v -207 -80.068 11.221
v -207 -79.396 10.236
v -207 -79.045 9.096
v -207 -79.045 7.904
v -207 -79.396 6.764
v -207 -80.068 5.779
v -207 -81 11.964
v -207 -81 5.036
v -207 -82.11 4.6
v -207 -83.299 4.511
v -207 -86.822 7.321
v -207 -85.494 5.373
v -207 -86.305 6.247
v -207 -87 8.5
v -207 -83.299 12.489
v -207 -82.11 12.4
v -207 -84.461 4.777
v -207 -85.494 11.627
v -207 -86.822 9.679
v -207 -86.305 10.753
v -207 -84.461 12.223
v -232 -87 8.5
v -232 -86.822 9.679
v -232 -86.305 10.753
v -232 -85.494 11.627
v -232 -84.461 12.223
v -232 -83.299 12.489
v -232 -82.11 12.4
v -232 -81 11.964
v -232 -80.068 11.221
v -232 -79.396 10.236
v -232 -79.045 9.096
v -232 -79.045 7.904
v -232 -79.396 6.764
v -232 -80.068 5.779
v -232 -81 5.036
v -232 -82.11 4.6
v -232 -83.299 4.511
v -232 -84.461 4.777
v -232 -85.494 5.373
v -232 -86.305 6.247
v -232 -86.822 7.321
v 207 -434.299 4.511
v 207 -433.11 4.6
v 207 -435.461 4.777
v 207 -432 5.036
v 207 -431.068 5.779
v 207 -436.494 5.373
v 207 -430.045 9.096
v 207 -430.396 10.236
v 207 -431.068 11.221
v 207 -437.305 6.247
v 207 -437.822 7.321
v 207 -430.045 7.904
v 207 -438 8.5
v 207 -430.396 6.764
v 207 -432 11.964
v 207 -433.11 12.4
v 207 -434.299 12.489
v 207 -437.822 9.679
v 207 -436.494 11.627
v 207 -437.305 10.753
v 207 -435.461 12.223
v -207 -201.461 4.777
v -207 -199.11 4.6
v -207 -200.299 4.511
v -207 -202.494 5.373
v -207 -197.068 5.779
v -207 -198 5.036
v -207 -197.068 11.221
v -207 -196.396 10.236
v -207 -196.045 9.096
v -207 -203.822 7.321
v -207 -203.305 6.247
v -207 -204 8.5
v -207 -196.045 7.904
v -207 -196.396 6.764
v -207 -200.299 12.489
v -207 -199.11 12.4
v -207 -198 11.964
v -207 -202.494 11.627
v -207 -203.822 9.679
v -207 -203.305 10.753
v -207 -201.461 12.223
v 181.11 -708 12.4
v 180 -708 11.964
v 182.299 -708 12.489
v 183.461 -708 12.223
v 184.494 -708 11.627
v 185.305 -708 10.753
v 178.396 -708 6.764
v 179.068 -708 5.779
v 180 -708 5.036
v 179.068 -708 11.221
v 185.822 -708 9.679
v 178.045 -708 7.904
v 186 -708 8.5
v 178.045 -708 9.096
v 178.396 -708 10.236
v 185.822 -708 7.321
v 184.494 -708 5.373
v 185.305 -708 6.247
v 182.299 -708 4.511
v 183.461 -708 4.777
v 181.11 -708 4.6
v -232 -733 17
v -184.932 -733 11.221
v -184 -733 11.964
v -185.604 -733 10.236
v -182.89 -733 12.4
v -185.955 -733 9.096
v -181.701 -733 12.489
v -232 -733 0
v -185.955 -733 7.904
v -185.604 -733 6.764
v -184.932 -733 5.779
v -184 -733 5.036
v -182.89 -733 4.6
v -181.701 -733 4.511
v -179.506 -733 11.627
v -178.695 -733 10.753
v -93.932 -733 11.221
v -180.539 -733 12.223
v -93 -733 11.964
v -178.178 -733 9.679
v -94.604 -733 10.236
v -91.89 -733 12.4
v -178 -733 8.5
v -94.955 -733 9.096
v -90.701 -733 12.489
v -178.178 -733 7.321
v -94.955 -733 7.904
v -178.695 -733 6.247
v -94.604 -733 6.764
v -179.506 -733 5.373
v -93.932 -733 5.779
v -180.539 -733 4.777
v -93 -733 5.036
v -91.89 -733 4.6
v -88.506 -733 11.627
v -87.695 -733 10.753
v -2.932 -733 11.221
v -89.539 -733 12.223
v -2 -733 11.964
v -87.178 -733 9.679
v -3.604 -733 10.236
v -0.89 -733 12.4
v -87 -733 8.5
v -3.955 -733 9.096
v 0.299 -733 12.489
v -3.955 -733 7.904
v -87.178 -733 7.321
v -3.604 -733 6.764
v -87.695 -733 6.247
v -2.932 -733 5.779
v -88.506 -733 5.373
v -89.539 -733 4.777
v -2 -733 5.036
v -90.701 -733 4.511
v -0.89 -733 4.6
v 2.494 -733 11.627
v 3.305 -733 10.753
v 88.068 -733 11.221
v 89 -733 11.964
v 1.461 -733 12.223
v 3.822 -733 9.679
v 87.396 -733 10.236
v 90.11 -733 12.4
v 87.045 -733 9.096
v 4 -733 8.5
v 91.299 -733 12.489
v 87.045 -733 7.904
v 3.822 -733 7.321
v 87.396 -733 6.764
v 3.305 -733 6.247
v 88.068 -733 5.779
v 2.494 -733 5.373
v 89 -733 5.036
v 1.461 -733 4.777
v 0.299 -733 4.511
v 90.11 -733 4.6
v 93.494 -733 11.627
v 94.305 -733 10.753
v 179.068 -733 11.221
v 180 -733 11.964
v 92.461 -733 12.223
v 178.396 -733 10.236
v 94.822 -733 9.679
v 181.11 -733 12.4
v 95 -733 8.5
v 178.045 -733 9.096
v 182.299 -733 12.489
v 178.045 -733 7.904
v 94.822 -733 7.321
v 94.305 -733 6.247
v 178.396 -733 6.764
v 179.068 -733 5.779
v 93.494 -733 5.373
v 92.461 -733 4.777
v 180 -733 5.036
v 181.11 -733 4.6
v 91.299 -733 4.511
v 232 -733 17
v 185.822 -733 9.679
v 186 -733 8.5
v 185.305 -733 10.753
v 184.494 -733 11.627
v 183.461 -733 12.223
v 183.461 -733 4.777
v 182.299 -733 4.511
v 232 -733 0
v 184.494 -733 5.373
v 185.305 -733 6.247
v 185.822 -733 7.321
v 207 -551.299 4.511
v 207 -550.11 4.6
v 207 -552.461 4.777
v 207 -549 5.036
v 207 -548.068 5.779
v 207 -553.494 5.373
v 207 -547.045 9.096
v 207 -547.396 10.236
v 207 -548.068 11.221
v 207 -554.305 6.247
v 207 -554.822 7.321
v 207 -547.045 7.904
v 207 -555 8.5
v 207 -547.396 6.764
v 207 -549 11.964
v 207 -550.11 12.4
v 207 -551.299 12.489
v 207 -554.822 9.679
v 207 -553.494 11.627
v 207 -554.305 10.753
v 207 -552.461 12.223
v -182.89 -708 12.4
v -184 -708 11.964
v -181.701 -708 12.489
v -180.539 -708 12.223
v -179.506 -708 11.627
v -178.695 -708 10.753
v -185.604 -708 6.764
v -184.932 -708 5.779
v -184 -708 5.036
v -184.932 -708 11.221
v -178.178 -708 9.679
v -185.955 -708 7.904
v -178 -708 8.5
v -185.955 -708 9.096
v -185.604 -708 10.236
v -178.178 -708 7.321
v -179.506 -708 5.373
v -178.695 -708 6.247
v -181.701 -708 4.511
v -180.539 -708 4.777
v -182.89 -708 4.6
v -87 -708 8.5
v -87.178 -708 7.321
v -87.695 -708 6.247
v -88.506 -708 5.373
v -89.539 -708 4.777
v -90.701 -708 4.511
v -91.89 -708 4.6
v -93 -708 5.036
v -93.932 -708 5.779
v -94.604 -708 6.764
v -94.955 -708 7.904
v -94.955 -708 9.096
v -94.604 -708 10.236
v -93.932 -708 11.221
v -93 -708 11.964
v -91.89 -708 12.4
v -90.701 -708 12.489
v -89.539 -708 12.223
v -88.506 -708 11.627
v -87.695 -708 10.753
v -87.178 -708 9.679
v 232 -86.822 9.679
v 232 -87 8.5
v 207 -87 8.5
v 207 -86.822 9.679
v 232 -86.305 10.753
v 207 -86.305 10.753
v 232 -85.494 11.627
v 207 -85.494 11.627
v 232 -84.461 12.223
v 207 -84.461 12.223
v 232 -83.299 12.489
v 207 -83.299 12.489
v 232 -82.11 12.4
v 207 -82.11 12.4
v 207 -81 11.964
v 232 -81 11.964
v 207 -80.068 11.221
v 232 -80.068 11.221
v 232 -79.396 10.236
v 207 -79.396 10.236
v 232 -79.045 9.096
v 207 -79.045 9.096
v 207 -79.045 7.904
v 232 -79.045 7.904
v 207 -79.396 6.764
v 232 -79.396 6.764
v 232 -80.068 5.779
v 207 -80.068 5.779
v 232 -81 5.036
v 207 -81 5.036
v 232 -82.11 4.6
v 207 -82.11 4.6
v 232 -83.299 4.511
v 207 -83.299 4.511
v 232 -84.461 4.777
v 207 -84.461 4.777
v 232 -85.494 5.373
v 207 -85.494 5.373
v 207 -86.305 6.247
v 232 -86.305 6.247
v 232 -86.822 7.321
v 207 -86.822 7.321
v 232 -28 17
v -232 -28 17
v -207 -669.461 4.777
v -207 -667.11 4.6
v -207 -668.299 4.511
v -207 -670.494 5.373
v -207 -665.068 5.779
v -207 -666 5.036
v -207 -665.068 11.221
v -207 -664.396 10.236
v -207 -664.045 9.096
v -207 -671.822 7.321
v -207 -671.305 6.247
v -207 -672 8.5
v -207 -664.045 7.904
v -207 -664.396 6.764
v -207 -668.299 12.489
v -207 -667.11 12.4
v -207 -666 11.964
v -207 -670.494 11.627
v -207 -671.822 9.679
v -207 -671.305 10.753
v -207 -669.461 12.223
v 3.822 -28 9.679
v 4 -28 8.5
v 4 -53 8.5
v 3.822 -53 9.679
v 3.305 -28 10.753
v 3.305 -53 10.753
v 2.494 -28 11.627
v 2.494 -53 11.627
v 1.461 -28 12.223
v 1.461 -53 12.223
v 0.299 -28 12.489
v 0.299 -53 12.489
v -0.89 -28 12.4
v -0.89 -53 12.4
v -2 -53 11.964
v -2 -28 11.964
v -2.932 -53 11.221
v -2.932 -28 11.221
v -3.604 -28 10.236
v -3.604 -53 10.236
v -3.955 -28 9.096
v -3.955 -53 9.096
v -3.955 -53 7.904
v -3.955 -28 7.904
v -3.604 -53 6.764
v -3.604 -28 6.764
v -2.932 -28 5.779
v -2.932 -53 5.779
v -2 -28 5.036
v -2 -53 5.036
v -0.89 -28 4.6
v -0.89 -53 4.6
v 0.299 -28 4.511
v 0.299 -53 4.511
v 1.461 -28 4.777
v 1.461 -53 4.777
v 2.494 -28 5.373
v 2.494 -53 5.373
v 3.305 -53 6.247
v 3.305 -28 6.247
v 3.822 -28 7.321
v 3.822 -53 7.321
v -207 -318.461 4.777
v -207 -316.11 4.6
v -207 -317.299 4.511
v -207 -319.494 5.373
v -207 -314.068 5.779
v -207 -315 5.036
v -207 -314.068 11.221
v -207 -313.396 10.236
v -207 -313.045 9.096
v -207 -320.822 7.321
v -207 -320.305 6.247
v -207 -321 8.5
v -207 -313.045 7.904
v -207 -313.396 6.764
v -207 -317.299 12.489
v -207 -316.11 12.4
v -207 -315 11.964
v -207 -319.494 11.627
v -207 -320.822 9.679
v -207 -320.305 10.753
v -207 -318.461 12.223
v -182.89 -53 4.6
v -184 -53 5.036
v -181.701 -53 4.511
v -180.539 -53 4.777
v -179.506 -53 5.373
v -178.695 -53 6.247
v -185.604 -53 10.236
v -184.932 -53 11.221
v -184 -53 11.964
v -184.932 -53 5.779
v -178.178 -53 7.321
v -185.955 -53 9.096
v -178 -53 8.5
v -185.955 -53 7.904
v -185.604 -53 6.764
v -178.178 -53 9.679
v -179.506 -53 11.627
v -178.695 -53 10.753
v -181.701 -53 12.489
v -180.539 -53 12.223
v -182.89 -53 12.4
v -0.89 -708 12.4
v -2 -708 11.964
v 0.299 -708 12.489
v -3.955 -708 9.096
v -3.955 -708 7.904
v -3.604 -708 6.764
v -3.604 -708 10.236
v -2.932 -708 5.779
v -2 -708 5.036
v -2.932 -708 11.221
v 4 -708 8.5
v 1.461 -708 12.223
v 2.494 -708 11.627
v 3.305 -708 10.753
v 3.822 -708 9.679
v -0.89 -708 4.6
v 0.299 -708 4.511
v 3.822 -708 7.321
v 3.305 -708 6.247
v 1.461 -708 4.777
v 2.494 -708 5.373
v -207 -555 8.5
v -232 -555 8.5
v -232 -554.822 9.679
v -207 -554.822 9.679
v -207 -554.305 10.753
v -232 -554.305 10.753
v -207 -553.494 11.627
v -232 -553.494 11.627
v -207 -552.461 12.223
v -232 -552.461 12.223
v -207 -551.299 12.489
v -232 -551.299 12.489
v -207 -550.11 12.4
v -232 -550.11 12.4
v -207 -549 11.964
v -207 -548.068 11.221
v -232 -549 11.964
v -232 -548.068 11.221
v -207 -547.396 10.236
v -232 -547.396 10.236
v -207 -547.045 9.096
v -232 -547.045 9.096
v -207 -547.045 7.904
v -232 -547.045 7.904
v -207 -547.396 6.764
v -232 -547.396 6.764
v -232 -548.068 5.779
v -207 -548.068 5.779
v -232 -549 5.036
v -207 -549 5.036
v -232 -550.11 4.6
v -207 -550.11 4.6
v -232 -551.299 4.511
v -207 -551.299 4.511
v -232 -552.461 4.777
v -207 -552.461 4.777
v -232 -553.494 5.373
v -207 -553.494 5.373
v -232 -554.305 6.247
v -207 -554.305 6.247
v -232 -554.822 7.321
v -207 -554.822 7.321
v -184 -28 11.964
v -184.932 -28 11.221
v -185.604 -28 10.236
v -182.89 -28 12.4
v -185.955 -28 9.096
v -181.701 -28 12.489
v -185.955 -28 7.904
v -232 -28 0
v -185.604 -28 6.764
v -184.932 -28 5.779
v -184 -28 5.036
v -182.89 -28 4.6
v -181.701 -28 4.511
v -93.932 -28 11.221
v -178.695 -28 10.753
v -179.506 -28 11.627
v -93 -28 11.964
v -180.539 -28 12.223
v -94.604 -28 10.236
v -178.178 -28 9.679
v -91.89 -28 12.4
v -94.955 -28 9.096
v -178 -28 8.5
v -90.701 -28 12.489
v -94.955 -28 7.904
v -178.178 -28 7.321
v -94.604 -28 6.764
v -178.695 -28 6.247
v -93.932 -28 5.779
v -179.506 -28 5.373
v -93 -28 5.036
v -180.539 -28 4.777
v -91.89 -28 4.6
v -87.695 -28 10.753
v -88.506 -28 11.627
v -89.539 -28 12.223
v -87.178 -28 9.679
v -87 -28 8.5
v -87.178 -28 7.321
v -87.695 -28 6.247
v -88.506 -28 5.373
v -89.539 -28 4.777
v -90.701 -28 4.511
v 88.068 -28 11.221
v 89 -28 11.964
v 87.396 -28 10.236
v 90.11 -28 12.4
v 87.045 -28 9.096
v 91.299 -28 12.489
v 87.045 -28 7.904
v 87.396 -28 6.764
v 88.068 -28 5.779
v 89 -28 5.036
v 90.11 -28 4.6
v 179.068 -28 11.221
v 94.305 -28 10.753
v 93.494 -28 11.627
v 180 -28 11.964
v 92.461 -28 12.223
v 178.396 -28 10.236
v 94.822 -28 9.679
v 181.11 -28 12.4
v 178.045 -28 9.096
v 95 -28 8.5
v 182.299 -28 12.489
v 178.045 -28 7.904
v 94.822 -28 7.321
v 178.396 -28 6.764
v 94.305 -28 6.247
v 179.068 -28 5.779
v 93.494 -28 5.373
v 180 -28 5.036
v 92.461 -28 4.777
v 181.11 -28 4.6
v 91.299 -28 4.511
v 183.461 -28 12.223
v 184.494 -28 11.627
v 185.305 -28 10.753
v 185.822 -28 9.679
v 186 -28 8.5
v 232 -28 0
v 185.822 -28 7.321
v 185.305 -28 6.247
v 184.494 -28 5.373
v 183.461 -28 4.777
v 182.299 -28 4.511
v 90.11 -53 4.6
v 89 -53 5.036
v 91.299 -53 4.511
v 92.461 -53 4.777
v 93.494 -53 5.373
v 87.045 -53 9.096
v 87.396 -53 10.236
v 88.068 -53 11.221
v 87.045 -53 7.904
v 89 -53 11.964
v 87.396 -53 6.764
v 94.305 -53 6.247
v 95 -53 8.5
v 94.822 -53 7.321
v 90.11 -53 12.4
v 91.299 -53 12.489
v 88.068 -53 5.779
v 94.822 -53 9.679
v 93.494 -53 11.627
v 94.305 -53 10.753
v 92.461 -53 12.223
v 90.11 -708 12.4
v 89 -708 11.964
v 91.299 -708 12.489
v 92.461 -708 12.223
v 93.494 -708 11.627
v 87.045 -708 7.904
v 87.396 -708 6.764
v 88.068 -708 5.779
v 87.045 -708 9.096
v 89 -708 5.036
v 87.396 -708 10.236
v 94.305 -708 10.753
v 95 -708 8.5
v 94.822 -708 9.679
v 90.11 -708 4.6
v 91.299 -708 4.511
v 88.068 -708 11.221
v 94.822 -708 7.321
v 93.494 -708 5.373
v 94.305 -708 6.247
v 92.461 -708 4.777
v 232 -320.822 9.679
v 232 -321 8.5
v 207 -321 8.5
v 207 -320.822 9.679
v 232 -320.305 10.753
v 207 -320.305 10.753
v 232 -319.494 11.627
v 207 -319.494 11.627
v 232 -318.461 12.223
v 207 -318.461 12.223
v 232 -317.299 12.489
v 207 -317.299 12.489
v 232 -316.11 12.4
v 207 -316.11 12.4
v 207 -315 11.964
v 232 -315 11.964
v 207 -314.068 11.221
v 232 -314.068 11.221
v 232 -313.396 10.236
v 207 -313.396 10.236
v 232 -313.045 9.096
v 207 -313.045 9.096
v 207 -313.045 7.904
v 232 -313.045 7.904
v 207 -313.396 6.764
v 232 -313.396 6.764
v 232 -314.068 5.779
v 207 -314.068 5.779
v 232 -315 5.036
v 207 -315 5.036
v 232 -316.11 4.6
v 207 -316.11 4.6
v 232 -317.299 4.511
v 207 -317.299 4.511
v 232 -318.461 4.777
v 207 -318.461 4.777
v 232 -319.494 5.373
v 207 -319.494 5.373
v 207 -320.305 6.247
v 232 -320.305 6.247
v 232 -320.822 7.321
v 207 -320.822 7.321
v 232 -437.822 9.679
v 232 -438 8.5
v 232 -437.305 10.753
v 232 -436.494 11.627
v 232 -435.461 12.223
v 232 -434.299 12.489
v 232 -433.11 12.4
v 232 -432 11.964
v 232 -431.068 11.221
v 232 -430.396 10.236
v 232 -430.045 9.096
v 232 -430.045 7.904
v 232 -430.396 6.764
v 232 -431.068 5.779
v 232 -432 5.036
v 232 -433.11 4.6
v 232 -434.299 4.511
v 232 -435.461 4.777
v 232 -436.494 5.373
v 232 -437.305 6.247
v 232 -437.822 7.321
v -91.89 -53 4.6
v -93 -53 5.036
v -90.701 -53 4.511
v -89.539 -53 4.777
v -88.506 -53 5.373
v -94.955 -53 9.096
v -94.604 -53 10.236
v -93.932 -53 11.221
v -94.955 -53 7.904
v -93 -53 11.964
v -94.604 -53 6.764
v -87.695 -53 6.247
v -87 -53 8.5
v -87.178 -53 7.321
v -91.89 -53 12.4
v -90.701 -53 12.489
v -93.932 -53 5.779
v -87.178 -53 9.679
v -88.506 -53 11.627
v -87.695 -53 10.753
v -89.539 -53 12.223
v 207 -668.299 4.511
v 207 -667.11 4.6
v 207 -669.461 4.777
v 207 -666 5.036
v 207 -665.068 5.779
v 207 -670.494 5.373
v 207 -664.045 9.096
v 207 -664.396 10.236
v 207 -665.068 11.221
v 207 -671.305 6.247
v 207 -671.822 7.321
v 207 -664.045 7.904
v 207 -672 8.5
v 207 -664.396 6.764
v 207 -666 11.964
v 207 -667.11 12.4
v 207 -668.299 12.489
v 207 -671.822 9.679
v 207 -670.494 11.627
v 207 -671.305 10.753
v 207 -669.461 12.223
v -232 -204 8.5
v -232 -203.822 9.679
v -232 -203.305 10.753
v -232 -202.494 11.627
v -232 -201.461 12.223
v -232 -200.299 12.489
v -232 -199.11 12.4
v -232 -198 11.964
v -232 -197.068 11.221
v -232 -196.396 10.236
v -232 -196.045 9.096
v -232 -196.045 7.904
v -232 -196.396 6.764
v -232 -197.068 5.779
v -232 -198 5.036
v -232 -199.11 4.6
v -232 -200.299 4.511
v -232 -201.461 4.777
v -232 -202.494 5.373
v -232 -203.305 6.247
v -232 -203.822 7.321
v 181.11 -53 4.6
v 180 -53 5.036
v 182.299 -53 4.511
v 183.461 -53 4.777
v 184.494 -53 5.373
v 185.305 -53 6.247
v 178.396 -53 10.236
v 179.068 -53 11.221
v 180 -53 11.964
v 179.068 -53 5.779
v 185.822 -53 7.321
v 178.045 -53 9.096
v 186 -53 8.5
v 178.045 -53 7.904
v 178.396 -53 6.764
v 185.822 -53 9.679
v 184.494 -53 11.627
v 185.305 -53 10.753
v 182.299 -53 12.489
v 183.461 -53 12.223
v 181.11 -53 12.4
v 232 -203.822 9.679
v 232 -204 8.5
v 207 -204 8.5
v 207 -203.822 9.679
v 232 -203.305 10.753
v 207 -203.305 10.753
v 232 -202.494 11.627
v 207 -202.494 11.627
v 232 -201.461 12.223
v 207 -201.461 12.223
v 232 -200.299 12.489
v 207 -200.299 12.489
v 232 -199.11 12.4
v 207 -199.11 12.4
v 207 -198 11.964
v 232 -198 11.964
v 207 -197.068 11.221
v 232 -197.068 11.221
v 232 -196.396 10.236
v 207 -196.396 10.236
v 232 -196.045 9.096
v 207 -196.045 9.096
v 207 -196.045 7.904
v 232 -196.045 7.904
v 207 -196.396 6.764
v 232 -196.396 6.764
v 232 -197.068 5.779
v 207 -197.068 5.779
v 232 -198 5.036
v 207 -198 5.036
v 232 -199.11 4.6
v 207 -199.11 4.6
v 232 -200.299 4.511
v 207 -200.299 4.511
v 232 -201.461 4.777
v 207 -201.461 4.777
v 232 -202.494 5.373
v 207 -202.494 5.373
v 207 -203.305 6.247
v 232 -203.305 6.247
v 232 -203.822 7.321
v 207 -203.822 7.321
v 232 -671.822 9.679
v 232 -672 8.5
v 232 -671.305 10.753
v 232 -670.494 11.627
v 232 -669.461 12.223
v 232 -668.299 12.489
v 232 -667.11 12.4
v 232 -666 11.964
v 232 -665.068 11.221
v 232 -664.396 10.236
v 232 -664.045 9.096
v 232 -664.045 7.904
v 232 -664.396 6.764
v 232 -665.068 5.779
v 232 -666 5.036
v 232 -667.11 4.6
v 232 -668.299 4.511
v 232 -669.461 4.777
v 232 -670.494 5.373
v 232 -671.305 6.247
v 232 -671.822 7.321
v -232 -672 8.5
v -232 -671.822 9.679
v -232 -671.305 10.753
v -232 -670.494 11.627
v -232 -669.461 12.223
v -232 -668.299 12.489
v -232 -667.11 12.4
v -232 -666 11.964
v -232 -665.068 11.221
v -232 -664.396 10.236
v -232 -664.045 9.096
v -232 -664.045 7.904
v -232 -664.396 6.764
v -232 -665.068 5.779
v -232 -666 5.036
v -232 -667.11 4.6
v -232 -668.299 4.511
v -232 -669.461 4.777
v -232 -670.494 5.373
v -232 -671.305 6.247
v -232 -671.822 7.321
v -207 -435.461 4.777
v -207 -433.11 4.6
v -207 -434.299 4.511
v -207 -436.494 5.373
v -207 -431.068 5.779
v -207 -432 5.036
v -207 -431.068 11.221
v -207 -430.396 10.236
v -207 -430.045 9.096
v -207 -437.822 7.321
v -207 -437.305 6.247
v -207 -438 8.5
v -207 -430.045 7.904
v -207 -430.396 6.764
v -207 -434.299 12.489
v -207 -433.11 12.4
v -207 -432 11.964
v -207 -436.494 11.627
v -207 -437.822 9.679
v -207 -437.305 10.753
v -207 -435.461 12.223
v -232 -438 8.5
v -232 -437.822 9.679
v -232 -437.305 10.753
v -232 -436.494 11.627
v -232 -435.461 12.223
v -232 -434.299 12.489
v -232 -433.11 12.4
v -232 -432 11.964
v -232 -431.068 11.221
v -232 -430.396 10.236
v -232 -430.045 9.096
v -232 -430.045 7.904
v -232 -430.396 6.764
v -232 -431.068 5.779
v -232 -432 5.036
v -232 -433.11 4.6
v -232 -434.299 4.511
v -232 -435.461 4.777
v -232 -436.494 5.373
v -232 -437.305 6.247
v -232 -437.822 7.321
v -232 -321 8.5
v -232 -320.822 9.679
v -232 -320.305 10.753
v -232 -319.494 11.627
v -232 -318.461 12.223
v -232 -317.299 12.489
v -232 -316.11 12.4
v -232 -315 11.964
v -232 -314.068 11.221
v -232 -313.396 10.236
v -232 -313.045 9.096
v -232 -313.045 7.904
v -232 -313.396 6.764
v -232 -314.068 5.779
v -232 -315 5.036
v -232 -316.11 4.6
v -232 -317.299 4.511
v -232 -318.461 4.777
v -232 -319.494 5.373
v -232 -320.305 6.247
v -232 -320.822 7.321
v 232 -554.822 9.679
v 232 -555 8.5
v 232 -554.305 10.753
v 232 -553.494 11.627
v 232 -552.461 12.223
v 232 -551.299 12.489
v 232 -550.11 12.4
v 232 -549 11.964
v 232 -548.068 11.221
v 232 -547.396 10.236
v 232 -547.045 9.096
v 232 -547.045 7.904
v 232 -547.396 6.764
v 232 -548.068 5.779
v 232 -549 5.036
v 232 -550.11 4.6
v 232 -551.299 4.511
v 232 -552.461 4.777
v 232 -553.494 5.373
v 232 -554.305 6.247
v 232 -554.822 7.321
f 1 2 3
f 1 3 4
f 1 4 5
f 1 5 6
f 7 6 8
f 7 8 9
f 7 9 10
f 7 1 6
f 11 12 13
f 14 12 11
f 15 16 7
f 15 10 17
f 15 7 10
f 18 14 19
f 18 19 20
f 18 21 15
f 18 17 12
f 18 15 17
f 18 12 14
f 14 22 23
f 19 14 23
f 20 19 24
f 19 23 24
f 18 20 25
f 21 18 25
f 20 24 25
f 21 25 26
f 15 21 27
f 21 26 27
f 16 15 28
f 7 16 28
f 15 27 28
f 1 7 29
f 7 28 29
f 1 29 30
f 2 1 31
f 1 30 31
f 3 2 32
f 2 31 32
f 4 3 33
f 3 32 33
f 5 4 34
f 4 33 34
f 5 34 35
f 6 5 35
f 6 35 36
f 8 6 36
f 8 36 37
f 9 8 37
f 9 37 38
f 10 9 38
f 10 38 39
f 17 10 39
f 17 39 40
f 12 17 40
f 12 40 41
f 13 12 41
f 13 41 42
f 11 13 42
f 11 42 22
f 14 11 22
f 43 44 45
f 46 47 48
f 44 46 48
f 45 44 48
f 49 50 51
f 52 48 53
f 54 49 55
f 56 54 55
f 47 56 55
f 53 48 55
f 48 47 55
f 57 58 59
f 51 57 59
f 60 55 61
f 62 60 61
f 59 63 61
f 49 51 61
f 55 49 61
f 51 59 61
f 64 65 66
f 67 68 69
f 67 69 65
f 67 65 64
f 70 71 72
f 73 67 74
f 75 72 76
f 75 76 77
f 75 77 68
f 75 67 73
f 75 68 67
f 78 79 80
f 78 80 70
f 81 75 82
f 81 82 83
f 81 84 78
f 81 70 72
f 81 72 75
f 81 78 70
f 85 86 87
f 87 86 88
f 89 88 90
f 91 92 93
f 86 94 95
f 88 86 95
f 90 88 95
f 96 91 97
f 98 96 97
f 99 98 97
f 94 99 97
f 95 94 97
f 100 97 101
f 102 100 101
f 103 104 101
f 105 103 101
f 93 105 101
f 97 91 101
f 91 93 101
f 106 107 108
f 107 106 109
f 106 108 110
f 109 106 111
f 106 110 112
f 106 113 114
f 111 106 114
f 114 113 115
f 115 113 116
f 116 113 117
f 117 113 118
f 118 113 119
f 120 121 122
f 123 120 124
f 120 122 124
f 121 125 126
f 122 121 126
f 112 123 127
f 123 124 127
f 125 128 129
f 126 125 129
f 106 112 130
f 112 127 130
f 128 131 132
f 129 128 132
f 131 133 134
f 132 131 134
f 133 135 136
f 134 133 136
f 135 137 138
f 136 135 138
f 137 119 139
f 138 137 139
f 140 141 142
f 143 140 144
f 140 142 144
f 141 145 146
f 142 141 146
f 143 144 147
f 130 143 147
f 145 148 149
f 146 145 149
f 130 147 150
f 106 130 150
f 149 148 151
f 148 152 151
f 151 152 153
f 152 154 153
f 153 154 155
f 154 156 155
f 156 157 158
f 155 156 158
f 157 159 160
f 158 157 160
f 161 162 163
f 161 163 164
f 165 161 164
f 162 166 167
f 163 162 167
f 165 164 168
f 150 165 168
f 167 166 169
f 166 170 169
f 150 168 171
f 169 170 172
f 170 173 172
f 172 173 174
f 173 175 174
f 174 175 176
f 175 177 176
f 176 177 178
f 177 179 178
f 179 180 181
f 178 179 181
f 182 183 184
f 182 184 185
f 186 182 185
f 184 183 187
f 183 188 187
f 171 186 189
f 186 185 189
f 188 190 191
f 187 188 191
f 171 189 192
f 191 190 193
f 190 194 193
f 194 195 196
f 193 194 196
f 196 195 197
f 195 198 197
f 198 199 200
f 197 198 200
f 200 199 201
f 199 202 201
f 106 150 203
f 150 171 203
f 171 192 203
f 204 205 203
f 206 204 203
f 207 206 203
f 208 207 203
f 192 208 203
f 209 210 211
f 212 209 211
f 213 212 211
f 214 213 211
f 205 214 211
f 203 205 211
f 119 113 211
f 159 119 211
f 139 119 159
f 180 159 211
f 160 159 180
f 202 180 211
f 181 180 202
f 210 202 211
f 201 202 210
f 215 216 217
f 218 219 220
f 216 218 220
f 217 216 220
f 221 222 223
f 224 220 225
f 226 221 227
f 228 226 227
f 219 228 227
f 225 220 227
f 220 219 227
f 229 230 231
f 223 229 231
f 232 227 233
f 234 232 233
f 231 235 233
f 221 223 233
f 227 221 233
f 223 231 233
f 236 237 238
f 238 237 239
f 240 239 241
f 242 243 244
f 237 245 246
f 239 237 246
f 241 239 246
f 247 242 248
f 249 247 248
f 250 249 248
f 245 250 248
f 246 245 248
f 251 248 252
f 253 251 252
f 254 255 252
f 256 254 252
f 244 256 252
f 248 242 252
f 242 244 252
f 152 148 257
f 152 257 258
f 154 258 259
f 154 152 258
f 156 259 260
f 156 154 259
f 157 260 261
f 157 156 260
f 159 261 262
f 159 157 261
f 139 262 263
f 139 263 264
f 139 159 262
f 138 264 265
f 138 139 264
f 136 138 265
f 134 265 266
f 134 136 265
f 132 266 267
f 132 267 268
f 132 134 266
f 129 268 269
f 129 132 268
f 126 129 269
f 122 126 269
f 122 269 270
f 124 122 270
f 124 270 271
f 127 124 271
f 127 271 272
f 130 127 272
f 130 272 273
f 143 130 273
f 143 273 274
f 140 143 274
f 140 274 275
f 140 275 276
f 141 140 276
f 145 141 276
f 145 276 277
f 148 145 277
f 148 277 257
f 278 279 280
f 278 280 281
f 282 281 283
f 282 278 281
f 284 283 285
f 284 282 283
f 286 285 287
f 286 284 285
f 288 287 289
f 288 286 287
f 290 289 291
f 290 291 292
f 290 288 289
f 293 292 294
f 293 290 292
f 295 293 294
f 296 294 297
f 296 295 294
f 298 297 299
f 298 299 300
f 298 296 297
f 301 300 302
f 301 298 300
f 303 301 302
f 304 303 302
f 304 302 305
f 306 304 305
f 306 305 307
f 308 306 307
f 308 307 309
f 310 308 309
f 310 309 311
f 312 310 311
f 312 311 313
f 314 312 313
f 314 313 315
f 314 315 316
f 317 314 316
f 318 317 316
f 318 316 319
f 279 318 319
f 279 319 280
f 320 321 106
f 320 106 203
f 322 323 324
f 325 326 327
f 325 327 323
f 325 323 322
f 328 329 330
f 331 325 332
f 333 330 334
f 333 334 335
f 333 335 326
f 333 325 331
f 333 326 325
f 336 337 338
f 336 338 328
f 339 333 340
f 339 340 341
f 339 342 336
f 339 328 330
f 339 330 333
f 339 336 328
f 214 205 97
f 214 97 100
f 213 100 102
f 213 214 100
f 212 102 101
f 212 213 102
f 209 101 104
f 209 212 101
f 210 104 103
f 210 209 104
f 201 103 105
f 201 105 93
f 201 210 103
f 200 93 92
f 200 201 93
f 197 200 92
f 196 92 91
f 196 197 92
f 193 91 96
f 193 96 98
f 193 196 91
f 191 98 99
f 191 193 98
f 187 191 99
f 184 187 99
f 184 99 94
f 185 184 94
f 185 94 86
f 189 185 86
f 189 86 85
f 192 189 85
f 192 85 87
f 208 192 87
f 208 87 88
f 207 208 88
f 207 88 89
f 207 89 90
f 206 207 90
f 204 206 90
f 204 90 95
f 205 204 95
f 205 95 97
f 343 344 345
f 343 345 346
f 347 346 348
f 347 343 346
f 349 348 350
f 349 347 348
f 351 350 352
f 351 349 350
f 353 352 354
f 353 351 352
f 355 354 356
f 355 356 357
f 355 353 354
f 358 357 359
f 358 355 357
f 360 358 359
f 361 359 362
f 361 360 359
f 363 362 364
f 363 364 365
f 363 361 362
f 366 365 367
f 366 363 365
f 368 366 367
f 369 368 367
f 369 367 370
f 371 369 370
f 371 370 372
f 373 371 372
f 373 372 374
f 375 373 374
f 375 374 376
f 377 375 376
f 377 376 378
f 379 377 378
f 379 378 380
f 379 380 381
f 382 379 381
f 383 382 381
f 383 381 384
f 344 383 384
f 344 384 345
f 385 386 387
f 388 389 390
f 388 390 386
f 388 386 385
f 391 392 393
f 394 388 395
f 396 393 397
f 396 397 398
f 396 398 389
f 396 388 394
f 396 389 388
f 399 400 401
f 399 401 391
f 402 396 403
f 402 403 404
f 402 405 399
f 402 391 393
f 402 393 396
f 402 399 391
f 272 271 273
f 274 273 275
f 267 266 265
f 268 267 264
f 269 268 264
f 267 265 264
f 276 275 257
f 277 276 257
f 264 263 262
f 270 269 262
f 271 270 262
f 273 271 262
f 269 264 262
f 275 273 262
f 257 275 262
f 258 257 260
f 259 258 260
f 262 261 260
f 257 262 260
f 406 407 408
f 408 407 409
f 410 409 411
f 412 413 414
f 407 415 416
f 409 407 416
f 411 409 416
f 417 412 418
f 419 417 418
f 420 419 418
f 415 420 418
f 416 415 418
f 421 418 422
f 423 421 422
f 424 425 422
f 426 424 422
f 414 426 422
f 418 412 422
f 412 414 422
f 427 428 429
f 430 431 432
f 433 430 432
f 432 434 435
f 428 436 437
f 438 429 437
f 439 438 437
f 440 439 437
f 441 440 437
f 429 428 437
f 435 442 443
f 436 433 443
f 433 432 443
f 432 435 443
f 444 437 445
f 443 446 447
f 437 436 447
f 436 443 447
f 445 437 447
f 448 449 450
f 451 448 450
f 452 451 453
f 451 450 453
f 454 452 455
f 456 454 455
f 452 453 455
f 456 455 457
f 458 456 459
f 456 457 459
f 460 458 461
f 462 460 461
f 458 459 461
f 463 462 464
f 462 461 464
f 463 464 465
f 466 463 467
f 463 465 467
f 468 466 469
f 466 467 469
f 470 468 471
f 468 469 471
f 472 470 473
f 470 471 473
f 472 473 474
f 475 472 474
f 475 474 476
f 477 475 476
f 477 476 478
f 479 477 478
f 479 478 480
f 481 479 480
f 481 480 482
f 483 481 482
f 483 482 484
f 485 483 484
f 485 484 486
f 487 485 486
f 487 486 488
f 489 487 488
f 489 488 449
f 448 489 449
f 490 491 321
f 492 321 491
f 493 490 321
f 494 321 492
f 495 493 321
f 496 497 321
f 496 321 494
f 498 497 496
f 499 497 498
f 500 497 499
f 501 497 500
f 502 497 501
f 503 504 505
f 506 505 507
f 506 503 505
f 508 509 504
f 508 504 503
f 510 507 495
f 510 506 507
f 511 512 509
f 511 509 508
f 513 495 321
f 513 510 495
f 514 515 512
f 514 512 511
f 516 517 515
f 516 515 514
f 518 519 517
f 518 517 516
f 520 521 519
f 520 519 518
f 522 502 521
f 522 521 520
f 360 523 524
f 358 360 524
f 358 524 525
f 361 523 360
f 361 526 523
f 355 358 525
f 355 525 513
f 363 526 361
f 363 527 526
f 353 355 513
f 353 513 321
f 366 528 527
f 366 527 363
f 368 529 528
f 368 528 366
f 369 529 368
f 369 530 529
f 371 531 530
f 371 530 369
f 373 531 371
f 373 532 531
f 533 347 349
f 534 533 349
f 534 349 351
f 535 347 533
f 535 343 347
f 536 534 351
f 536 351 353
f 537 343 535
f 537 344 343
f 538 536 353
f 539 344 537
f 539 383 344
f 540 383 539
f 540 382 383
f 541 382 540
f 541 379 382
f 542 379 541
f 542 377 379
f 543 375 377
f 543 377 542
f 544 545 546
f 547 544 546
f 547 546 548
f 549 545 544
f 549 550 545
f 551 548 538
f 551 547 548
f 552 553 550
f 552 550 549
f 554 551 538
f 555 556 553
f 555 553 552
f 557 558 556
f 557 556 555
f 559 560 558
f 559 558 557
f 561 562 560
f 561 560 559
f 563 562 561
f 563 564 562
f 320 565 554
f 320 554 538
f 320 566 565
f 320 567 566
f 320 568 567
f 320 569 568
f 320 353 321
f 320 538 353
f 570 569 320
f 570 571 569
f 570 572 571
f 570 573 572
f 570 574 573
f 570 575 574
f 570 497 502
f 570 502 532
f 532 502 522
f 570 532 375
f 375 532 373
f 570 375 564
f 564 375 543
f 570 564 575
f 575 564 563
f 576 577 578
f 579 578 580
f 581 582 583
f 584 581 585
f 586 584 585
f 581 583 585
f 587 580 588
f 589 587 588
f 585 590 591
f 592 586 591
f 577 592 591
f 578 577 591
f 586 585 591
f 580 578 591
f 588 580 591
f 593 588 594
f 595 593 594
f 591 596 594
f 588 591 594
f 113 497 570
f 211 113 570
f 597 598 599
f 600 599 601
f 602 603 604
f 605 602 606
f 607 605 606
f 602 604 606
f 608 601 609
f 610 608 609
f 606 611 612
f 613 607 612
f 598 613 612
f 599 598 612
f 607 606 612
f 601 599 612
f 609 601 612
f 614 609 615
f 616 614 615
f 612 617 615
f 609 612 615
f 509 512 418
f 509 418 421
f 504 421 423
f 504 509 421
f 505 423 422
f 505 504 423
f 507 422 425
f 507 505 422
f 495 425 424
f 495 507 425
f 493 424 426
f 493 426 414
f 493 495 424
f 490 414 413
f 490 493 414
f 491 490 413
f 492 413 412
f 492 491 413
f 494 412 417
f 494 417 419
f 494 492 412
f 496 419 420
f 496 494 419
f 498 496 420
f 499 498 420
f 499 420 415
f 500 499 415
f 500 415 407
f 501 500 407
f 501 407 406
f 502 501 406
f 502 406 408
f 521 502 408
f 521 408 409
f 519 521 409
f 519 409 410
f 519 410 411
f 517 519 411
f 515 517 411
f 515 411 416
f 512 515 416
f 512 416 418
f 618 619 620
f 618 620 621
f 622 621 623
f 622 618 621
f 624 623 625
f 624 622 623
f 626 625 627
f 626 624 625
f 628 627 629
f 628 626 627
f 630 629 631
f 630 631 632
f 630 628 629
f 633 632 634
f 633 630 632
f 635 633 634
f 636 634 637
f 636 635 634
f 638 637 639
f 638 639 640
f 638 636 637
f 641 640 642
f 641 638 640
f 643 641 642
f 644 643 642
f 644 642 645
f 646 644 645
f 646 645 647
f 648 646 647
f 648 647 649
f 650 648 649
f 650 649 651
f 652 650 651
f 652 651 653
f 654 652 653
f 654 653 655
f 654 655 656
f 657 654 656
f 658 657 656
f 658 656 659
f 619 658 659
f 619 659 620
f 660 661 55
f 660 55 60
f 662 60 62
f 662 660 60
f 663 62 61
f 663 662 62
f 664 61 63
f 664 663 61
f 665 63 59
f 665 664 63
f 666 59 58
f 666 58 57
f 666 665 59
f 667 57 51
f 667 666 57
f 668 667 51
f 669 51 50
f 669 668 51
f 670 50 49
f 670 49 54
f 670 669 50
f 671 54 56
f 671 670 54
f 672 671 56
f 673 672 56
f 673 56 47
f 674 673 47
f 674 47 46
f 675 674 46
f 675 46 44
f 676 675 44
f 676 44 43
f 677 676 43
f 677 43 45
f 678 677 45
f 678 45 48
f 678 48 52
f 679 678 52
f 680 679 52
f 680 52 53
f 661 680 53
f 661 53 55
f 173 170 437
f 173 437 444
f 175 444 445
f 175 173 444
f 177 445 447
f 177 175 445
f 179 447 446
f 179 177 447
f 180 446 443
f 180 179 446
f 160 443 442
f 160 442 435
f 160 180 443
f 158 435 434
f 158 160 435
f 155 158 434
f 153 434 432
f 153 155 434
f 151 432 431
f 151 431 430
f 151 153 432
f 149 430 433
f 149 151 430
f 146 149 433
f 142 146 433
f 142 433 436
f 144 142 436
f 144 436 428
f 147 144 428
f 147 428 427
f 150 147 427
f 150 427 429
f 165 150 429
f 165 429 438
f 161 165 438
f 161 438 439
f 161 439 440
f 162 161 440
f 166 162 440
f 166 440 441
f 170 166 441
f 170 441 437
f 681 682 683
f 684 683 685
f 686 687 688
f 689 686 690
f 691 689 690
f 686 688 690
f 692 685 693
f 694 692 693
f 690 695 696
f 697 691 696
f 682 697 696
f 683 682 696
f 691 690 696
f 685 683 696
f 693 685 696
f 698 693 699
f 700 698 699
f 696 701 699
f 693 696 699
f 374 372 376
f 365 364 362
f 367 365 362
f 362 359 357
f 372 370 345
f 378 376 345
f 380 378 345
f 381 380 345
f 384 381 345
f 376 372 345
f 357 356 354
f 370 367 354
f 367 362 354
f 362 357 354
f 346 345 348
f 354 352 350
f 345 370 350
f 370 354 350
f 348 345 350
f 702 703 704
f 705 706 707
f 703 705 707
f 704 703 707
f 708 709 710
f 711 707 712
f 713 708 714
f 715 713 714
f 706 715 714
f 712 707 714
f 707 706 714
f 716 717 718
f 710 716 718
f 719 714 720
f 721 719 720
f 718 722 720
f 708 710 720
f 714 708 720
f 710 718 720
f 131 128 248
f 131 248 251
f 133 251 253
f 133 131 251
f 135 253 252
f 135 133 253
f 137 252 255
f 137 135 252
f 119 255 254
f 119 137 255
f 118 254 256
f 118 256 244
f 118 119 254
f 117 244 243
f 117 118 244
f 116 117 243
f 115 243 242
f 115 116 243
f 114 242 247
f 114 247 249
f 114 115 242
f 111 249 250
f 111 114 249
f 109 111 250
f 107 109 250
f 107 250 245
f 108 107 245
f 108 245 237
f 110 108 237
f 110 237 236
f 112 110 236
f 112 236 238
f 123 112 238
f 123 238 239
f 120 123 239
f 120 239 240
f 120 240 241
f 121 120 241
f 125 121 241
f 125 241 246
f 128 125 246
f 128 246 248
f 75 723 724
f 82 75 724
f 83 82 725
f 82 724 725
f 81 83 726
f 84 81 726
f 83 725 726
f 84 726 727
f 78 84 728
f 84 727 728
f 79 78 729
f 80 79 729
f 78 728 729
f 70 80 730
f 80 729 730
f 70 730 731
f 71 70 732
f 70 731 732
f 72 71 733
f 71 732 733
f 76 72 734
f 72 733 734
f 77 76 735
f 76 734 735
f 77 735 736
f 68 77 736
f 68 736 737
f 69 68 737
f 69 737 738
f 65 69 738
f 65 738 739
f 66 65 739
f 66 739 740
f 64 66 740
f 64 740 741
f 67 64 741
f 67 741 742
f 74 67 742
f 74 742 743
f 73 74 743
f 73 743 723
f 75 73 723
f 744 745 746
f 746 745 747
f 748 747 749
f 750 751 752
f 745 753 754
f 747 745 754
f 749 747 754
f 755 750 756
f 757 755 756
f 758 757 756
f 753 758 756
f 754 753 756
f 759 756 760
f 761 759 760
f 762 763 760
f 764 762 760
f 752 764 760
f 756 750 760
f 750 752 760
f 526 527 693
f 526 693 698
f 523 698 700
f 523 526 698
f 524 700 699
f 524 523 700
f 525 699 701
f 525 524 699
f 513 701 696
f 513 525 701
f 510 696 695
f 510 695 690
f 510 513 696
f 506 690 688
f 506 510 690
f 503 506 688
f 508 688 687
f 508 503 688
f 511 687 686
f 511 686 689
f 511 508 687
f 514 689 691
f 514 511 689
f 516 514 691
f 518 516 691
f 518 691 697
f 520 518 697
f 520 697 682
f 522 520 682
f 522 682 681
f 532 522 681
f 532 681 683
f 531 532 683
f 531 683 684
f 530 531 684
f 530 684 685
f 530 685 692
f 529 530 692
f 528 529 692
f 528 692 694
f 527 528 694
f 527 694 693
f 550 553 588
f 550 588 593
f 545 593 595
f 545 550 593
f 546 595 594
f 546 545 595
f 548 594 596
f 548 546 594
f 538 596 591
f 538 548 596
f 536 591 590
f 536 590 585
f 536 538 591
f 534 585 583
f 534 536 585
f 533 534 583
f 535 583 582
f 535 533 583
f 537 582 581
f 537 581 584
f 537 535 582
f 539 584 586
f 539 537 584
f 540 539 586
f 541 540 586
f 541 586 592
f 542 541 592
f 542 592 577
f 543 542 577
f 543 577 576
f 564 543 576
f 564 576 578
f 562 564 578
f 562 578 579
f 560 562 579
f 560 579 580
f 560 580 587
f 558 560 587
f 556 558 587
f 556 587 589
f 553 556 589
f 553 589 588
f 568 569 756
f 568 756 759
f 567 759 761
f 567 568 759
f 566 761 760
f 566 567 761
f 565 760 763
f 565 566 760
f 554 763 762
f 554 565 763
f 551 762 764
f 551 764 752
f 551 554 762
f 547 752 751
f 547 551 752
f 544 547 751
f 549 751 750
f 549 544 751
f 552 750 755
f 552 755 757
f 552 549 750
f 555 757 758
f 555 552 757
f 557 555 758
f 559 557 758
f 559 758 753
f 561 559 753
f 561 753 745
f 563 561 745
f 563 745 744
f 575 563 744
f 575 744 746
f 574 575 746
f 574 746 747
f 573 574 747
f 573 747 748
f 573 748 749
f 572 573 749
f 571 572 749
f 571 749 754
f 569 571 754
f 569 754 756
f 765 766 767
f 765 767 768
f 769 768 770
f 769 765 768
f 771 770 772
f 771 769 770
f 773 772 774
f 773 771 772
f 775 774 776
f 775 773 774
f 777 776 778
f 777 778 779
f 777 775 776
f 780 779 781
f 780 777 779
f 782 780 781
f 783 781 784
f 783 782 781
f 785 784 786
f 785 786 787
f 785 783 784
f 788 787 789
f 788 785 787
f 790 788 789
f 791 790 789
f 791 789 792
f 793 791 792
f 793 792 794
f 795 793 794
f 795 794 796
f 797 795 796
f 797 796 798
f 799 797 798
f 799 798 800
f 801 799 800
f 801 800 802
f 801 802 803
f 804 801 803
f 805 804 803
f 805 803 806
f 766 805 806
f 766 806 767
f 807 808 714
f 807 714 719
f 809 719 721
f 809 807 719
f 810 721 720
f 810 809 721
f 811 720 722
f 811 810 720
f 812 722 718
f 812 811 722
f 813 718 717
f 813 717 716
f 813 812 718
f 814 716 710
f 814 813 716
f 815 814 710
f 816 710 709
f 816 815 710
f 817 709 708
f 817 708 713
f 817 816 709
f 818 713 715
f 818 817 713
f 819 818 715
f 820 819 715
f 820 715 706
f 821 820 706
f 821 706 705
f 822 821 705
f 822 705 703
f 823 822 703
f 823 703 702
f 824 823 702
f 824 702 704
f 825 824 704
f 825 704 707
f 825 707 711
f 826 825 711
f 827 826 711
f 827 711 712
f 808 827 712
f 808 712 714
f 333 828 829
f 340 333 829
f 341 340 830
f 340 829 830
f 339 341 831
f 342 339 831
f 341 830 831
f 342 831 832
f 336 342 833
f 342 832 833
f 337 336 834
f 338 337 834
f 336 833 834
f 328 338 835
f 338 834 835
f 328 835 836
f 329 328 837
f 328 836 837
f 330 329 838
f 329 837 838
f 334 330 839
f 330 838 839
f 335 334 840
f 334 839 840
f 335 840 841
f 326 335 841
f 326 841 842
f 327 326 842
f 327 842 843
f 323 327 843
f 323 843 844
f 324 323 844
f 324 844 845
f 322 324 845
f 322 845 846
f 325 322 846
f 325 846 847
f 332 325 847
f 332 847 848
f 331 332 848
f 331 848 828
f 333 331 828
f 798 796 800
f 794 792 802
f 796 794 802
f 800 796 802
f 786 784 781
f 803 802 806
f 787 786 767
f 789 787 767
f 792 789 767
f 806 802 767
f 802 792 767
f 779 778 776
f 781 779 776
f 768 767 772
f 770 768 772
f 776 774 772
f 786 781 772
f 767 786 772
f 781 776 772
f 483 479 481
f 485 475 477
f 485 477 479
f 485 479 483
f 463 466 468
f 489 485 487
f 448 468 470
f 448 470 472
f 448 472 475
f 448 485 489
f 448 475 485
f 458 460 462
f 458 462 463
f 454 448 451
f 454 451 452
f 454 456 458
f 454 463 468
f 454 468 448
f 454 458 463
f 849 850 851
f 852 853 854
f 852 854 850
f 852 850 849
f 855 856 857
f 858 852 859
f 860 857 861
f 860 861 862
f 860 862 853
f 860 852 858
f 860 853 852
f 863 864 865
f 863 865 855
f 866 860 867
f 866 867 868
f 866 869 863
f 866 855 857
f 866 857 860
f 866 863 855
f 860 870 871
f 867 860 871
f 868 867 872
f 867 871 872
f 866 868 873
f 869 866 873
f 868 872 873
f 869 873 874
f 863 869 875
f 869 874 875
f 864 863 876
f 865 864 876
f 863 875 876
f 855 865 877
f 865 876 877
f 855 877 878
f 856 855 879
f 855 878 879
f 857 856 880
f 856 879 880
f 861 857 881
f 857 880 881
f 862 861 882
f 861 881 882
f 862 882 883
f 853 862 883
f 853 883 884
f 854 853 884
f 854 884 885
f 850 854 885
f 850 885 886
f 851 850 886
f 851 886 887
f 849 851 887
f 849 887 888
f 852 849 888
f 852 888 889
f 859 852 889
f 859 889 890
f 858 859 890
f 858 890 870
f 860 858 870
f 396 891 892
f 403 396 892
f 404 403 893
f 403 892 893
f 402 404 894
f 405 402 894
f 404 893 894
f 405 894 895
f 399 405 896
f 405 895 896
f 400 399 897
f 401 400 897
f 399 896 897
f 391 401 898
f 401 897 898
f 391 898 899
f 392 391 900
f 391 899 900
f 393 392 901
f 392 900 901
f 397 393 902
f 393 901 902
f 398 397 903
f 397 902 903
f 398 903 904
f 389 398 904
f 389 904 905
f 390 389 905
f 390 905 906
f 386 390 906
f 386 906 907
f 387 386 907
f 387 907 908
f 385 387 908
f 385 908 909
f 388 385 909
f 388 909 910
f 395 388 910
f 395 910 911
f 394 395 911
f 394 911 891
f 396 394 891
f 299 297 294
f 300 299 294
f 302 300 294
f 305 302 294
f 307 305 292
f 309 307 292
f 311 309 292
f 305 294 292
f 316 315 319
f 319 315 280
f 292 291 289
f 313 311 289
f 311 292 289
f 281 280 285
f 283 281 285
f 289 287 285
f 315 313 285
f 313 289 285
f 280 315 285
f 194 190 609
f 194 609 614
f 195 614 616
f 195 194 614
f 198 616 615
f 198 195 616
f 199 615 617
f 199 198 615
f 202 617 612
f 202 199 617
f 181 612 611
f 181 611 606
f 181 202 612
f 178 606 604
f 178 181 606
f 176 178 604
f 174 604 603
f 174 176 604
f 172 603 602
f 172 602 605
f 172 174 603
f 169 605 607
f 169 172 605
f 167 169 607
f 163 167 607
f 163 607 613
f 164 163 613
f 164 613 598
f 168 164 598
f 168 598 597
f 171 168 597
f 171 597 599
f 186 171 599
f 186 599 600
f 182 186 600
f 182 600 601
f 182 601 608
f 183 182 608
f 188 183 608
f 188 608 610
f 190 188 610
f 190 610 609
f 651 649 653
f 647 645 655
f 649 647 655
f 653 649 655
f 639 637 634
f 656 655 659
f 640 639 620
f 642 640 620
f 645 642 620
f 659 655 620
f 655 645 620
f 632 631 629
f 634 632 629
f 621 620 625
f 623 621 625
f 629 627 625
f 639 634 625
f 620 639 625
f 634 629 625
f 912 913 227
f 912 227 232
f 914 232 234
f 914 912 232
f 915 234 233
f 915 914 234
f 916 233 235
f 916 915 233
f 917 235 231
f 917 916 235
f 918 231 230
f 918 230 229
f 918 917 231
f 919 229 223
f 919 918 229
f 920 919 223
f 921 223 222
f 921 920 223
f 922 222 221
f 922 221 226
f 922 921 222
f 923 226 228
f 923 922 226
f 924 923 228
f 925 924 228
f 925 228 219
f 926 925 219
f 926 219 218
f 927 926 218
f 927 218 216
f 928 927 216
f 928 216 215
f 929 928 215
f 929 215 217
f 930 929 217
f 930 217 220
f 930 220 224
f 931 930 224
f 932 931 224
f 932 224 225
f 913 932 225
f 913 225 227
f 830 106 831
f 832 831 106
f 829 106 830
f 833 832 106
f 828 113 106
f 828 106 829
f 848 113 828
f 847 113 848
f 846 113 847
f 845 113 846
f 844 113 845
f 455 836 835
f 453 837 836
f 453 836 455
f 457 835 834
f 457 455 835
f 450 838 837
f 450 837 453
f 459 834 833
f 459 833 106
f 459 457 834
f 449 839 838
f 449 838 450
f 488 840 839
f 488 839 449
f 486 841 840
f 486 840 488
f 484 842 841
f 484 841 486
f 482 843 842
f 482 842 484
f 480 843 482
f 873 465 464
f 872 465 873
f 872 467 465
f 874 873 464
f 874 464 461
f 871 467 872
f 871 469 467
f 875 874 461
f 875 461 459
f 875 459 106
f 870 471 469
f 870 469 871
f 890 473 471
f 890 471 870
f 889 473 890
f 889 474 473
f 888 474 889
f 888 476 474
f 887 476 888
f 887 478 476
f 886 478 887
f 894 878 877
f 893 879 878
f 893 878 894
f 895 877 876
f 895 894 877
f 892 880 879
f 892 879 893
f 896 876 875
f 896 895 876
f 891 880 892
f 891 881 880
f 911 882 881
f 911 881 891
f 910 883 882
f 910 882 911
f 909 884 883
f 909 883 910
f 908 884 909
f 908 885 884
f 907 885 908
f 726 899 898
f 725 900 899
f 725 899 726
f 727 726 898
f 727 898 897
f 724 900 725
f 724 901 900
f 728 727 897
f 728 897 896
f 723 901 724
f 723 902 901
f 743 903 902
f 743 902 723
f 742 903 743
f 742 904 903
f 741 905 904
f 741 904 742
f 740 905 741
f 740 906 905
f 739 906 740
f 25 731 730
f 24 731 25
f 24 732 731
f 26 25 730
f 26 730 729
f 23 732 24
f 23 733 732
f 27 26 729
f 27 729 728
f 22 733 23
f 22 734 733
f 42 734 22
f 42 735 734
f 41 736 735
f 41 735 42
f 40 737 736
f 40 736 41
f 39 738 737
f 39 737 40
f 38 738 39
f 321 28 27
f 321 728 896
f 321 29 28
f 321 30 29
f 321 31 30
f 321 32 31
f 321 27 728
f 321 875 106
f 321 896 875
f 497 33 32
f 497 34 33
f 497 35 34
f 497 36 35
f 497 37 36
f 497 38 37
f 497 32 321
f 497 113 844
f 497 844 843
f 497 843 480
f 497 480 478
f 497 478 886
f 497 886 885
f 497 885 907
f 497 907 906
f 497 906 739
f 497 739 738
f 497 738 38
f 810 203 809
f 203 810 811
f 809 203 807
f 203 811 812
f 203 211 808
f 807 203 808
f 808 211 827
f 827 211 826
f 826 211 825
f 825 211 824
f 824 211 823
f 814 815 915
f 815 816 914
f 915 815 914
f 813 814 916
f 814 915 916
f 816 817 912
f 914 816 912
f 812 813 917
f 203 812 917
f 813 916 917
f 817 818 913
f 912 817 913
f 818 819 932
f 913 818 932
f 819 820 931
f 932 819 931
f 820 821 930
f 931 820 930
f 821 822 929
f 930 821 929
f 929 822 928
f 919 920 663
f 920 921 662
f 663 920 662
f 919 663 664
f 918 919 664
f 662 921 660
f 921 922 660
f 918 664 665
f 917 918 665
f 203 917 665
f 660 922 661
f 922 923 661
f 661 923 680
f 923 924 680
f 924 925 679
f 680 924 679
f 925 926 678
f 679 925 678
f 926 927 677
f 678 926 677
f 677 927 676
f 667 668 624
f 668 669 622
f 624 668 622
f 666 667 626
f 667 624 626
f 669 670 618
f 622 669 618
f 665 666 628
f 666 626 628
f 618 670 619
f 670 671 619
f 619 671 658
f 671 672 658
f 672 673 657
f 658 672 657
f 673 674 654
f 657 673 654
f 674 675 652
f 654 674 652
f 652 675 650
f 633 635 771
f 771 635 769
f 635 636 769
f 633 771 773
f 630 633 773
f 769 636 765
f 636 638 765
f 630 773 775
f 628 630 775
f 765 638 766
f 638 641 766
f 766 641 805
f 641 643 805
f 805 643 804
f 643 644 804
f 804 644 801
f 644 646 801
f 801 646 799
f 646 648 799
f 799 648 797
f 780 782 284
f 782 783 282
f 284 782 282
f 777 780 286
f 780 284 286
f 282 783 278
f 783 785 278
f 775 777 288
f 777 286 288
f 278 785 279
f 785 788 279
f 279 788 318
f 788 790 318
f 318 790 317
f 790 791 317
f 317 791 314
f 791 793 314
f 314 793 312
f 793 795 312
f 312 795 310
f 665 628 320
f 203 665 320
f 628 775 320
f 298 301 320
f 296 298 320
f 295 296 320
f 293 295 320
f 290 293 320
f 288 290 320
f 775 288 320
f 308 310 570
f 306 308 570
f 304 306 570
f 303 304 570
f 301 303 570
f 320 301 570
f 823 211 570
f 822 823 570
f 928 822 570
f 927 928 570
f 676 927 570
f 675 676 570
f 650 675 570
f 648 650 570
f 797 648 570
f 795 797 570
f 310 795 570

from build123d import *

# Parameters (mm, degrees)
SKETCH1_W                = 464
SKETCH1_H                = 705
BOSS_EXTRUDE1_DEPTH      = 17
CUT_EXTRUDE4_DEPTH       = 25
CUT_EXTRUDE4_DEPTH_BACK  = 13
SKETCH5_R                = 4
CUT_EXTRUDE12_START      = -13
SKETCH13_R               = 4
CUT_EXTRUDE12_DEPTH      = 38
CUT_EXTRUDE13_DEPTH      = 25
CUT_EXTRUDE13_DEPTH_BACK = 13
SKETCH14_R               = 4


with BuildPart() as part:
    # Sketch1 → Boss-Extrude1 (new body)
    with BuildSketch(Plane.XY):
        with Locations((0, -380.5)):
            Rectangle(SKETCH1_W, SKETCH1_H)
    extrude(amount=BOSS_EXTRUDE1_DEPTH)

    # Sketch5 → Cut-Extrude4 (cut, two sides: drawn at the far end of the back side and taken through both)
    with BuildSketch(Plane(origin=(0, -28, 254), x_dir=(1, 0, 0), z_dir=(0, -1, 0)).offset(-CUT_EXTRUDE4_DEPTH_BACK)):
        with Locations((182, -245.5)):
            Circle(SKETCH5_R)
        with Locations((-182, -245.5)):
            Circle(SKETCH5_R)
        with Locations((91, -245.5)):
            Circle(SKETCH5_R)
        with Locations((0, -245.5)):
            Circle(SKETCH5_R)
        with Locations((-91, -245.5)):
            Circle(SKETCH5_R)
    extrude(amount=CUT_EXTRUDE4_DEPTH + CUT_EXTRUDE4_DEPTH_BACK, mode=Mode.SUBTRACT)

    # Sketch13 → Cut-Extrude12 (cut)
    with BuildSketch(Plane(origin=(232, 0, 254), x_dir=(0, 0, 1), z_dir=(-1, 0, 0)).offset(CUT_EXTRUDE12_START)):
        with Locations(Location((-245.5, -83, 0), (0, 0, 270))):
            Circle(SKETCH13_R)
        with Locations(Location((-245.5, -200, 0), (0, 0, 270))):
            Circle(SKETCH13_R)
        with Locations(Location((-245.5, -317, 0), (0, 0, 270))):
            Circle(SKETCH13_R)
        with Locations(Location((-245.5, -434, 0), (0, 0, 270))):
            Circle(SKETCH13_R)
        with Locations(Location((-245.5, -551, 0), (0, 0, 270))):
            Circle(SKETCH13_R)
        with Locations(Location((-245.5, -668, 0), (0, 0, 270))):
            Circle(SKETCH13_R)
    cut_extrude12 = extrude(amount=CUT_EXTRUDE12_DEPTH, mode=Mode.SUBTRACT)

    # Mirror1: Cut-Extrude12 across plane
    add(cut_extrude12.mirror(Plane(origin=(0, 0, 0), x_dir=(0, 0, 1), z_dir=(1, 0, 0))), mode=Mode.SUBTRACT)

    # Sketch14 → Cut-Extrude13 (cut, two sides: drawn at the far end of the back side and taken through both)
    with BuildSketch(Plane(origin=(0, -733, 254), x_dir=(1, 0, 0), z_dir=(0, 1, 0)).offset(-CUT_EXTRUDE13_DEPTH_BACK)):
        with Locations((182, 245.5)):
            Circle(SKETCH14_R)
        with Locations((-182, 245.5)):
            Circle(SKETCH14_R)
        with Locations((91, 245.5)):
            Circle(SKETCH14_R)
        with Locations((0, 245.5)):
            Circle(SKETCH14_R)
        with Locations((-91, 245.5)):
            Circle(SKETCH14_R)
    extrude(amount=CUT_EXTRUDE13_DEPTH + CUT_EXTRUDE13_DEPTH_BACK, mode=Mode.SUBTRACT)


solid = part.part
